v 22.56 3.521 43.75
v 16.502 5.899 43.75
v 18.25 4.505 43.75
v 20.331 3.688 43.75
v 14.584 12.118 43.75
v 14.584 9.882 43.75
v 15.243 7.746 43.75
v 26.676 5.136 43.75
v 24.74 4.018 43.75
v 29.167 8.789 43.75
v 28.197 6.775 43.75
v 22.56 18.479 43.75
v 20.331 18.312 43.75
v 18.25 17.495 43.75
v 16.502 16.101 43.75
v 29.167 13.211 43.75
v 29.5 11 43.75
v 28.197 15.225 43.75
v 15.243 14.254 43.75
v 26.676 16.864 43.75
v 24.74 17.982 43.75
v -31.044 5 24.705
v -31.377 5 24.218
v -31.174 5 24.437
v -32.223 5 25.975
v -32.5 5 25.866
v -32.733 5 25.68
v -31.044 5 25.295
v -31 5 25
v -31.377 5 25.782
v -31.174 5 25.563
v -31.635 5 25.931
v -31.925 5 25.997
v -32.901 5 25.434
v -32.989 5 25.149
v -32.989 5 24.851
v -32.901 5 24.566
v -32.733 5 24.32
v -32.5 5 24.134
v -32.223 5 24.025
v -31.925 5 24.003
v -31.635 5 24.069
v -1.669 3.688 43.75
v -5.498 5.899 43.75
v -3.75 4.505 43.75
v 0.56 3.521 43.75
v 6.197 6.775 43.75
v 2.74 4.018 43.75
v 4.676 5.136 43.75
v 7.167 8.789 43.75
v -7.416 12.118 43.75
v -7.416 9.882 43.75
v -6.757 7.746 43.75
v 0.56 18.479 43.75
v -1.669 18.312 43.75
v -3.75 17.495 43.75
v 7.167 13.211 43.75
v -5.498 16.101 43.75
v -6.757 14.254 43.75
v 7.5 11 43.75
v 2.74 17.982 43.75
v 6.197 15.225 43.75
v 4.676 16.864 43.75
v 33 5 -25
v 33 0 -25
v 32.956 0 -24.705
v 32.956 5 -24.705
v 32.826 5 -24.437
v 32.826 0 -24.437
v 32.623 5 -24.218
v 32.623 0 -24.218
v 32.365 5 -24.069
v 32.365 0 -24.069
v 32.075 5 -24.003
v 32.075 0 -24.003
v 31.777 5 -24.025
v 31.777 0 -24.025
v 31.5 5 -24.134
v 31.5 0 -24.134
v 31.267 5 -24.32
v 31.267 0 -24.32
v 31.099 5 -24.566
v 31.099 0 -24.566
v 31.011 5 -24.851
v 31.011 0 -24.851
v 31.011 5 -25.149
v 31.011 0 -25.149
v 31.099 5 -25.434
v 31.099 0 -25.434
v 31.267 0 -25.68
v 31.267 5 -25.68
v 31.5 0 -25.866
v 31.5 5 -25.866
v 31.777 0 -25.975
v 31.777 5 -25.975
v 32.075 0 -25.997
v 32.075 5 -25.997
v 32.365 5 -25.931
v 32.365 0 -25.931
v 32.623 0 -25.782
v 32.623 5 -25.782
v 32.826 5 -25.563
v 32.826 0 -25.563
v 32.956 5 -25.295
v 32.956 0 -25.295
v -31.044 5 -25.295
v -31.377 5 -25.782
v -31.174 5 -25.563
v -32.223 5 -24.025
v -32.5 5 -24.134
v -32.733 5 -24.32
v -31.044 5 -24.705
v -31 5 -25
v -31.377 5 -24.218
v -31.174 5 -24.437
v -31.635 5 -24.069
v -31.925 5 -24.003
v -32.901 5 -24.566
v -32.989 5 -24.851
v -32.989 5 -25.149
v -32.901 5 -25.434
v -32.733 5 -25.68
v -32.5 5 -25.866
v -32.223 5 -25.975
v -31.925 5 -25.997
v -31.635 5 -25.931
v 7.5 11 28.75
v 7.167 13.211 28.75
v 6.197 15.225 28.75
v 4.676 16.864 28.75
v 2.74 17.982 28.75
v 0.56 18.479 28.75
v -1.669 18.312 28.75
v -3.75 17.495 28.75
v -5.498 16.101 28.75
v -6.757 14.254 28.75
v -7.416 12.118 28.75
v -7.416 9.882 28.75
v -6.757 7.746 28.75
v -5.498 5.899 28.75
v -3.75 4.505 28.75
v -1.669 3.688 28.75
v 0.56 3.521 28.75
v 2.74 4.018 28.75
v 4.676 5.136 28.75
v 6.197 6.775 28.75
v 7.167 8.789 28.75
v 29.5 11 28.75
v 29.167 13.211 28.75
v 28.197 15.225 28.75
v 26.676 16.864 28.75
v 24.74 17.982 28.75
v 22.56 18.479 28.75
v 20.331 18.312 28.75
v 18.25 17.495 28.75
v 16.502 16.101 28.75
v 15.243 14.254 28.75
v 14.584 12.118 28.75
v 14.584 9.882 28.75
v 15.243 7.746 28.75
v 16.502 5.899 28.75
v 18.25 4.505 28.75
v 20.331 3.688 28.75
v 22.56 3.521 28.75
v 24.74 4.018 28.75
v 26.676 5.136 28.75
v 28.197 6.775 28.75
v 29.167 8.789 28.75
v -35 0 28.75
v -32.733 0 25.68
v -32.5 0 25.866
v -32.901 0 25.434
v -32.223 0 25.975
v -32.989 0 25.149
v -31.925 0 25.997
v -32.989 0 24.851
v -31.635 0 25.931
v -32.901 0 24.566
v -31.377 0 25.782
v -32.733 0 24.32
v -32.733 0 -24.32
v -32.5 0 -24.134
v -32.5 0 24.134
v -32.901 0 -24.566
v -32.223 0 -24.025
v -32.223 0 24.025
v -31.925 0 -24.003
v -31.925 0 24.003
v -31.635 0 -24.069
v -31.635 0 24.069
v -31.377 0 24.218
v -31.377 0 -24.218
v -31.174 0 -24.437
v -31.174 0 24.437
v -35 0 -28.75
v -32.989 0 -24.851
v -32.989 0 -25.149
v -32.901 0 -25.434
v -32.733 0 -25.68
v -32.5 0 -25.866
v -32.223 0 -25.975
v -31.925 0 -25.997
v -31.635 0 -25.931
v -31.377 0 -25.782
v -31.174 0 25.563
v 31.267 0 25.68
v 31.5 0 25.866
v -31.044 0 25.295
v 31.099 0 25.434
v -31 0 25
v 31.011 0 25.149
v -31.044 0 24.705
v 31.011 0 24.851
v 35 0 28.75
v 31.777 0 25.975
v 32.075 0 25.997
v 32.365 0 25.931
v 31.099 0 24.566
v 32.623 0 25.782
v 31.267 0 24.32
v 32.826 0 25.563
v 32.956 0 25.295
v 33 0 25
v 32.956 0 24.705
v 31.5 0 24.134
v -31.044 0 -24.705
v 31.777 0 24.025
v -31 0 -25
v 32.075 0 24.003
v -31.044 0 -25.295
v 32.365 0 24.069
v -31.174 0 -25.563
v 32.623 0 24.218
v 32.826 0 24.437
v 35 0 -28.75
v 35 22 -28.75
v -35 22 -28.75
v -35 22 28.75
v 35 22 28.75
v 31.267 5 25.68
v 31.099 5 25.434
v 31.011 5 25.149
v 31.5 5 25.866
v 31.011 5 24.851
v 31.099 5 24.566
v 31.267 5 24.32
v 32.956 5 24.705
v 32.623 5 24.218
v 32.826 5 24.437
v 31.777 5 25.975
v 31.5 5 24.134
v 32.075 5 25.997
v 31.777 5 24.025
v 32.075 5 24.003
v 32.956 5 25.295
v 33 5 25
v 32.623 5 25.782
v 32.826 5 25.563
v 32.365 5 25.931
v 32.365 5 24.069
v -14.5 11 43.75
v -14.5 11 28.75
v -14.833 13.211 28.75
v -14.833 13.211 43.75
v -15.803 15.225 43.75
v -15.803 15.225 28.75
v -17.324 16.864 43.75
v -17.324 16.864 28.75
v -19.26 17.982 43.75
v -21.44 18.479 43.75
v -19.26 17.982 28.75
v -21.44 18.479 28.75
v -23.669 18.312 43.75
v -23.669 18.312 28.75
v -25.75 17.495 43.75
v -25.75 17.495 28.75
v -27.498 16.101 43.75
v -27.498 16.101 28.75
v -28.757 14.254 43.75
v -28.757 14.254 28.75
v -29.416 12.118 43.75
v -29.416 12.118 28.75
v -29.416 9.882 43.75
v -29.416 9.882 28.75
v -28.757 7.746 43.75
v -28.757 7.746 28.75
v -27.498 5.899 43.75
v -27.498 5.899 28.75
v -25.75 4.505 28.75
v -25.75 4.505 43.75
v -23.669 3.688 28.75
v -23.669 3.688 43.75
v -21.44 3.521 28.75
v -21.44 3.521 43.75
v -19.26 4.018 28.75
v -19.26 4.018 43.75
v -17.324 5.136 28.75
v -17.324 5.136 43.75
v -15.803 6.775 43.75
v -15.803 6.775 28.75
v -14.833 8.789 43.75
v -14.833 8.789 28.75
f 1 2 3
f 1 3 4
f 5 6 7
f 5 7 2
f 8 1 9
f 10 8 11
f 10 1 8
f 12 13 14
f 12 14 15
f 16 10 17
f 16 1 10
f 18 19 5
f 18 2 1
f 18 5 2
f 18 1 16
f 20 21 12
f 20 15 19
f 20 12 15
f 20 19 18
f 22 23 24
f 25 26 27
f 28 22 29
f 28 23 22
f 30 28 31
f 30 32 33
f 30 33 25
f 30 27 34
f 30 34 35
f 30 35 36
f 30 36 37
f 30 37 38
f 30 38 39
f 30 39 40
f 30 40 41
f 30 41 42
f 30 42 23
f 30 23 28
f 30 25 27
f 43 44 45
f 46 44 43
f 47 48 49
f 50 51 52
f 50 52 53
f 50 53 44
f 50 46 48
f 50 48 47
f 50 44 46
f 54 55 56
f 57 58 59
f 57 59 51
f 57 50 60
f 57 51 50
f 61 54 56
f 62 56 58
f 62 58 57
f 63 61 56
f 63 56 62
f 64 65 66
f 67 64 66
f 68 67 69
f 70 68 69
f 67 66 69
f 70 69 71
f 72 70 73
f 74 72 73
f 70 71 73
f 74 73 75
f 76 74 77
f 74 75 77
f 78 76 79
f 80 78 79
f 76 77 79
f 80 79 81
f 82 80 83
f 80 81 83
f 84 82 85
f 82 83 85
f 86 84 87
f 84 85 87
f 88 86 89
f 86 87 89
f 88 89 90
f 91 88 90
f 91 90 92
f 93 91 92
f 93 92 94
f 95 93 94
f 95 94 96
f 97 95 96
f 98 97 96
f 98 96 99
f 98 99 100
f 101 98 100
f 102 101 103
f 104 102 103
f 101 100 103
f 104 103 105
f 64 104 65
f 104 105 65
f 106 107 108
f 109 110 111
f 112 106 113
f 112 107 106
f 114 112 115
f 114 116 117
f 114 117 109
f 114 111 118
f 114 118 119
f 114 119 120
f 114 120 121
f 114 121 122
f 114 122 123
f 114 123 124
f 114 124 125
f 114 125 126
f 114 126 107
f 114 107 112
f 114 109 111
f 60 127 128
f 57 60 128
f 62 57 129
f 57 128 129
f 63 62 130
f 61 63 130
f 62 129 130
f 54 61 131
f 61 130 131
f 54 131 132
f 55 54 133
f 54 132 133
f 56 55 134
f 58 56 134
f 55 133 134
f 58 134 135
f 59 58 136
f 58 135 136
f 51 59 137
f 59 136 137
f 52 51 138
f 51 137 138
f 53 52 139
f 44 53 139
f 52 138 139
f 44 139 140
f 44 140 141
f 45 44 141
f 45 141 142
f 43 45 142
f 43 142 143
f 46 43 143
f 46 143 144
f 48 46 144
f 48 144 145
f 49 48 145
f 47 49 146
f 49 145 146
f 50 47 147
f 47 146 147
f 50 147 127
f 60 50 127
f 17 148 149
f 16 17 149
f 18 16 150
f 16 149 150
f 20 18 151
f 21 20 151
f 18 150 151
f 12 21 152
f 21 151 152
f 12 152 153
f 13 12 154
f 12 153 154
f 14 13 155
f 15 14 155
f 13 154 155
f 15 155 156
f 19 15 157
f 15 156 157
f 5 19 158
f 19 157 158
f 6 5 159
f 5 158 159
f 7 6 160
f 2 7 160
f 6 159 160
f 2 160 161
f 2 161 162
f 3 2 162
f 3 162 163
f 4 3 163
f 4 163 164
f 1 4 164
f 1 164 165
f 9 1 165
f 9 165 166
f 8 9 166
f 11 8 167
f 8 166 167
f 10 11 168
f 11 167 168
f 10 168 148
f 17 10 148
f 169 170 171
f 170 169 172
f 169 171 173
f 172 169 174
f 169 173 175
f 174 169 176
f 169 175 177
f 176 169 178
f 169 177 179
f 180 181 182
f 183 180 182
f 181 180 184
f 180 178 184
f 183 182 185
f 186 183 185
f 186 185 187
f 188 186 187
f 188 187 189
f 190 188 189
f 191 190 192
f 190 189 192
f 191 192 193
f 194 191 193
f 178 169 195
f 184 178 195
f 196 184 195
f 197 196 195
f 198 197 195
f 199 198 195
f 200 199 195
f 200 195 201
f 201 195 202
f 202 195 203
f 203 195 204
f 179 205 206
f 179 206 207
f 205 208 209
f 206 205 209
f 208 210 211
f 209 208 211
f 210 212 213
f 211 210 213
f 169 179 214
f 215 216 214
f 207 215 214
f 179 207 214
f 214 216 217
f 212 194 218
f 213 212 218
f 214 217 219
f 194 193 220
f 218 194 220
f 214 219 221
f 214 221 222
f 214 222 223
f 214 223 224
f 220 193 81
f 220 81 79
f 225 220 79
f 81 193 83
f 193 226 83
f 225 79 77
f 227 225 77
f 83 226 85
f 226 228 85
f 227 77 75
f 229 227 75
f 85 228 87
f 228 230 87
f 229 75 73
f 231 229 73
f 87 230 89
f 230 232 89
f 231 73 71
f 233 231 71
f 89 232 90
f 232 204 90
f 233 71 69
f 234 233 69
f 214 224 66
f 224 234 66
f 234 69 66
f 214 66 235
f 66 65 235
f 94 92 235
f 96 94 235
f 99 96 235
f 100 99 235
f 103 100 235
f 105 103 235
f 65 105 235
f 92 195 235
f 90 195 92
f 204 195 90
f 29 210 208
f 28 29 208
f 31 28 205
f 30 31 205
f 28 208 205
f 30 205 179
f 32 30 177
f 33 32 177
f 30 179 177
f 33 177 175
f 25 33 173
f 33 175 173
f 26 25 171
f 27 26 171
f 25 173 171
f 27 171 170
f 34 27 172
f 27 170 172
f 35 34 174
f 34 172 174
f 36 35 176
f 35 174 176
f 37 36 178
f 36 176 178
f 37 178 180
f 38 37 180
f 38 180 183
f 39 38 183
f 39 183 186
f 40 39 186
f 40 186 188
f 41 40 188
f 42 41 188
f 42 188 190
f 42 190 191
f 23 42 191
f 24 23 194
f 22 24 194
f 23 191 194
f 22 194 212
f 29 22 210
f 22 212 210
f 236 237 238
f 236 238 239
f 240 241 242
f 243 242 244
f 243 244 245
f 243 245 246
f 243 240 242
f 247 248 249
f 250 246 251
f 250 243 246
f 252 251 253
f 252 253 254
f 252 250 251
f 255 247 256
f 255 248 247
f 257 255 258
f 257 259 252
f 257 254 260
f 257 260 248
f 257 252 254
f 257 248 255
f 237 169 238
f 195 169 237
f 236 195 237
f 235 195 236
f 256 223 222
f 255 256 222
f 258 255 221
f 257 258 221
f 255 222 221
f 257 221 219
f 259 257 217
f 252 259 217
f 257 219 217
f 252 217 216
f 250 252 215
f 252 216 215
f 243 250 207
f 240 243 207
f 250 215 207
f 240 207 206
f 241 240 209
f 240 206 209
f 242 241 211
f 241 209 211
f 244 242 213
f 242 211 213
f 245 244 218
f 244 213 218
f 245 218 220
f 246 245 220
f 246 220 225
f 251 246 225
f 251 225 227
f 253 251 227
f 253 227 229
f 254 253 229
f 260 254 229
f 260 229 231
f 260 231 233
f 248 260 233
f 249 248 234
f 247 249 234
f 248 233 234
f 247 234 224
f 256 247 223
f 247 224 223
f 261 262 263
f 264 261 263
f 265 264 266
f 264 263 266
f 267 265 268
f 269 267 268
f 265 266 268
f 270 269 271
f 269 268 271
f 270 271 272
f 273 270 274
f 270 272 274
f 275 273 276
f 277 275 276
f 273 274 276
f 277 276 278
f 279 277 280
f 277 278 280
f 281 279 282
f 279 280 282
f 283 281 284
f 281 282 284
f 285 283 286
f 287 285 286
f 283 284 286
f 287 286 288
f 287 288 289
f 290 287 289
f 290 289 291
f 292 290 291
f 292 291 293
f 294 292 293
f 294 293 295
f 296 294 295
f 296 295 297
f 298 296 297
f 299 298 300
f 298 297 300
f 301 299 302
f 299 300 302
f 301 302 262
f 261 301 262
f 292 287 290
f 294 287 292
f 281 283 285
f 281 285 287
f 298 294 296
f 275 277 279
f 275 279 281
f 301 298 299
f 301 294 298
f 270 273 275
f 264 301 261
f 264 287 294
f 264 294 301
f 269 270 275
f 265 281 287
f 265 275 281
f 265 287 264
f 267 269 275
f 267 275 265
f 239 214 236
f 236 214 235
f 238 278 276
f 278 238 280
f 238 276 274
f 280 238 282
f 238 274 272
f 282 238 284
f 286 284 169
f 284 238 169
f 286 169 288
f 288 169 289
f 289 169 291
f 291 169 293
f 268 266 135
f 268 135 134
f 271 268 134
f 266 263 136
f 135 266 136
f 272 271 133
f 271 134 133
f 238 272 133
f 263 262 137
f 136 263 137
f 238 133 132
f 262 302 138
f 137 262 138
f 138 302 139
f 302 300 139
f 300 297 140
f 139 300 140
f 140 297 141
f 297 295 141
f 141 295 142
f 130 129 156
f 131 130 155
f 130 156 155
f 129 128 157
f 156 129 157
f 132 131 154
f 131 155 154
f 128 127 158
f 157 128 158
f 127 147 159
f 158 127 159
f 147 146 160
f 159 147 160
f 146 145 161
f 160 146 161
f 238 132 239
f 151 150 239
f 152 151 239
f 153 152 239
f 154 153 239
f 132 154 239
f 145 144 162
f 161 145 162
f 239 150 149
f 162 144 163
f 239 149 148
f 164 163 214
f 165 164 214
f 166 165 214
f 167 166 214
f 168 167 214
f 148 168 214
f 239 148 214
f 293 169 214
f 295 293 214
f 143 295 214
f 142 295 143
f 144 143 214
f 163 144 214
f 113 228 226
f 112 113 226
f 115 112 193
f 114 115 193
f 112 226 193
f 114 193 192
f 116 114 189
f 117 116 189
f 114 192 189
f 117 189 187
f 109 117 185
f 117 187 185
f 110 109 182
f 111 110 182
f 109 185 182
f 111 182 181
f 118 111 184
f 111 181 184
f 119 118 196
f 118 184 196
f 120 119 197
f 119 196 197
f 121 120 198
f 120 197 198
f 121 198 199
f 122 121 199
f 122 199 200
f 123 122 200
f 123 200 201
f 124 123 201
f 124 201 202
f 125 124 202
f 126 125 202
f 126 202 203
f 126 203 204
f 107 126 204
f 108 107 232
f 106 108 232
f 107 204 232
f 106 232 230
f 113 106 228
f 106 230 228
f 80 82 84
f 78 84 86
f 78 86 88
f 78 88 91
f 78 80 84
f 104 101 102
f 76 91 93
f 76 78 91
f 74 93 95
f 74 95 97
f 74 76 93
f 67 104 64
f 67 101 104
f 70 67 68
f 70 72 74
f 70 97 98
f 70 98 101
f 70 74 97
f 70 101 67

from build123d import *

# Parameters (mm, degrees)
SKETCH_1_W          = 70
SKETCH_1_H          = 57.5
EXTRUDE_1_DEPTH     = 22
SKETCH_2_R          = 7.5
EXTRUDE_2_DEPTH     = 15
SKETCH_3_R          = 1
CUT_EXTRUDE_1_DEPTH = 5


with BuildPart() as part:
    # 草图1 → 凸台-拉伸1 (new body)
    with BuildSketch(Plane(origin=(0, 0, 0), x_dir=(1, 0, 0), z_dir=(0, 1, 0))):
        Rectangle(SKETCH_1_W, SKETCH_1_H)
    extrude(amount=EXTRUDE_1_DEPTH)

    # 草图2 → 凸台-拉伸2 (add)
    with BuildSketch(Plane.XY.offset(28.75)):
        with Locations((-22, 11)):
            Circle(SKETCH_2_R)
        with Locations((0, 11)):
            Circle(SKETCH_2_R)
        with Locations((22, 11)):
            Circle(SKETCH_2_R)
    extrude(amount=EXTRUDE_2_DEPTH)

    # 草图3 → 切除-拉伸1 (cut)
    with BuildSketch(Plane.XZ):
        with Locations((-32, 25)):
            Circle(SKETCH_3_R)
        with Locations((-32, -25)):
            Circle(SKETCH_3_R)
        with Locations((32, -25)):
            Circle(SKETCH_3_R)
        with Locations((32, 25)):
            Circle(SKETCH_3_R)
    extrude(amount=-CUT_EXTRUDE_1_DEPTH, mode=Mode.SUBTRACT)


solid = part.part
